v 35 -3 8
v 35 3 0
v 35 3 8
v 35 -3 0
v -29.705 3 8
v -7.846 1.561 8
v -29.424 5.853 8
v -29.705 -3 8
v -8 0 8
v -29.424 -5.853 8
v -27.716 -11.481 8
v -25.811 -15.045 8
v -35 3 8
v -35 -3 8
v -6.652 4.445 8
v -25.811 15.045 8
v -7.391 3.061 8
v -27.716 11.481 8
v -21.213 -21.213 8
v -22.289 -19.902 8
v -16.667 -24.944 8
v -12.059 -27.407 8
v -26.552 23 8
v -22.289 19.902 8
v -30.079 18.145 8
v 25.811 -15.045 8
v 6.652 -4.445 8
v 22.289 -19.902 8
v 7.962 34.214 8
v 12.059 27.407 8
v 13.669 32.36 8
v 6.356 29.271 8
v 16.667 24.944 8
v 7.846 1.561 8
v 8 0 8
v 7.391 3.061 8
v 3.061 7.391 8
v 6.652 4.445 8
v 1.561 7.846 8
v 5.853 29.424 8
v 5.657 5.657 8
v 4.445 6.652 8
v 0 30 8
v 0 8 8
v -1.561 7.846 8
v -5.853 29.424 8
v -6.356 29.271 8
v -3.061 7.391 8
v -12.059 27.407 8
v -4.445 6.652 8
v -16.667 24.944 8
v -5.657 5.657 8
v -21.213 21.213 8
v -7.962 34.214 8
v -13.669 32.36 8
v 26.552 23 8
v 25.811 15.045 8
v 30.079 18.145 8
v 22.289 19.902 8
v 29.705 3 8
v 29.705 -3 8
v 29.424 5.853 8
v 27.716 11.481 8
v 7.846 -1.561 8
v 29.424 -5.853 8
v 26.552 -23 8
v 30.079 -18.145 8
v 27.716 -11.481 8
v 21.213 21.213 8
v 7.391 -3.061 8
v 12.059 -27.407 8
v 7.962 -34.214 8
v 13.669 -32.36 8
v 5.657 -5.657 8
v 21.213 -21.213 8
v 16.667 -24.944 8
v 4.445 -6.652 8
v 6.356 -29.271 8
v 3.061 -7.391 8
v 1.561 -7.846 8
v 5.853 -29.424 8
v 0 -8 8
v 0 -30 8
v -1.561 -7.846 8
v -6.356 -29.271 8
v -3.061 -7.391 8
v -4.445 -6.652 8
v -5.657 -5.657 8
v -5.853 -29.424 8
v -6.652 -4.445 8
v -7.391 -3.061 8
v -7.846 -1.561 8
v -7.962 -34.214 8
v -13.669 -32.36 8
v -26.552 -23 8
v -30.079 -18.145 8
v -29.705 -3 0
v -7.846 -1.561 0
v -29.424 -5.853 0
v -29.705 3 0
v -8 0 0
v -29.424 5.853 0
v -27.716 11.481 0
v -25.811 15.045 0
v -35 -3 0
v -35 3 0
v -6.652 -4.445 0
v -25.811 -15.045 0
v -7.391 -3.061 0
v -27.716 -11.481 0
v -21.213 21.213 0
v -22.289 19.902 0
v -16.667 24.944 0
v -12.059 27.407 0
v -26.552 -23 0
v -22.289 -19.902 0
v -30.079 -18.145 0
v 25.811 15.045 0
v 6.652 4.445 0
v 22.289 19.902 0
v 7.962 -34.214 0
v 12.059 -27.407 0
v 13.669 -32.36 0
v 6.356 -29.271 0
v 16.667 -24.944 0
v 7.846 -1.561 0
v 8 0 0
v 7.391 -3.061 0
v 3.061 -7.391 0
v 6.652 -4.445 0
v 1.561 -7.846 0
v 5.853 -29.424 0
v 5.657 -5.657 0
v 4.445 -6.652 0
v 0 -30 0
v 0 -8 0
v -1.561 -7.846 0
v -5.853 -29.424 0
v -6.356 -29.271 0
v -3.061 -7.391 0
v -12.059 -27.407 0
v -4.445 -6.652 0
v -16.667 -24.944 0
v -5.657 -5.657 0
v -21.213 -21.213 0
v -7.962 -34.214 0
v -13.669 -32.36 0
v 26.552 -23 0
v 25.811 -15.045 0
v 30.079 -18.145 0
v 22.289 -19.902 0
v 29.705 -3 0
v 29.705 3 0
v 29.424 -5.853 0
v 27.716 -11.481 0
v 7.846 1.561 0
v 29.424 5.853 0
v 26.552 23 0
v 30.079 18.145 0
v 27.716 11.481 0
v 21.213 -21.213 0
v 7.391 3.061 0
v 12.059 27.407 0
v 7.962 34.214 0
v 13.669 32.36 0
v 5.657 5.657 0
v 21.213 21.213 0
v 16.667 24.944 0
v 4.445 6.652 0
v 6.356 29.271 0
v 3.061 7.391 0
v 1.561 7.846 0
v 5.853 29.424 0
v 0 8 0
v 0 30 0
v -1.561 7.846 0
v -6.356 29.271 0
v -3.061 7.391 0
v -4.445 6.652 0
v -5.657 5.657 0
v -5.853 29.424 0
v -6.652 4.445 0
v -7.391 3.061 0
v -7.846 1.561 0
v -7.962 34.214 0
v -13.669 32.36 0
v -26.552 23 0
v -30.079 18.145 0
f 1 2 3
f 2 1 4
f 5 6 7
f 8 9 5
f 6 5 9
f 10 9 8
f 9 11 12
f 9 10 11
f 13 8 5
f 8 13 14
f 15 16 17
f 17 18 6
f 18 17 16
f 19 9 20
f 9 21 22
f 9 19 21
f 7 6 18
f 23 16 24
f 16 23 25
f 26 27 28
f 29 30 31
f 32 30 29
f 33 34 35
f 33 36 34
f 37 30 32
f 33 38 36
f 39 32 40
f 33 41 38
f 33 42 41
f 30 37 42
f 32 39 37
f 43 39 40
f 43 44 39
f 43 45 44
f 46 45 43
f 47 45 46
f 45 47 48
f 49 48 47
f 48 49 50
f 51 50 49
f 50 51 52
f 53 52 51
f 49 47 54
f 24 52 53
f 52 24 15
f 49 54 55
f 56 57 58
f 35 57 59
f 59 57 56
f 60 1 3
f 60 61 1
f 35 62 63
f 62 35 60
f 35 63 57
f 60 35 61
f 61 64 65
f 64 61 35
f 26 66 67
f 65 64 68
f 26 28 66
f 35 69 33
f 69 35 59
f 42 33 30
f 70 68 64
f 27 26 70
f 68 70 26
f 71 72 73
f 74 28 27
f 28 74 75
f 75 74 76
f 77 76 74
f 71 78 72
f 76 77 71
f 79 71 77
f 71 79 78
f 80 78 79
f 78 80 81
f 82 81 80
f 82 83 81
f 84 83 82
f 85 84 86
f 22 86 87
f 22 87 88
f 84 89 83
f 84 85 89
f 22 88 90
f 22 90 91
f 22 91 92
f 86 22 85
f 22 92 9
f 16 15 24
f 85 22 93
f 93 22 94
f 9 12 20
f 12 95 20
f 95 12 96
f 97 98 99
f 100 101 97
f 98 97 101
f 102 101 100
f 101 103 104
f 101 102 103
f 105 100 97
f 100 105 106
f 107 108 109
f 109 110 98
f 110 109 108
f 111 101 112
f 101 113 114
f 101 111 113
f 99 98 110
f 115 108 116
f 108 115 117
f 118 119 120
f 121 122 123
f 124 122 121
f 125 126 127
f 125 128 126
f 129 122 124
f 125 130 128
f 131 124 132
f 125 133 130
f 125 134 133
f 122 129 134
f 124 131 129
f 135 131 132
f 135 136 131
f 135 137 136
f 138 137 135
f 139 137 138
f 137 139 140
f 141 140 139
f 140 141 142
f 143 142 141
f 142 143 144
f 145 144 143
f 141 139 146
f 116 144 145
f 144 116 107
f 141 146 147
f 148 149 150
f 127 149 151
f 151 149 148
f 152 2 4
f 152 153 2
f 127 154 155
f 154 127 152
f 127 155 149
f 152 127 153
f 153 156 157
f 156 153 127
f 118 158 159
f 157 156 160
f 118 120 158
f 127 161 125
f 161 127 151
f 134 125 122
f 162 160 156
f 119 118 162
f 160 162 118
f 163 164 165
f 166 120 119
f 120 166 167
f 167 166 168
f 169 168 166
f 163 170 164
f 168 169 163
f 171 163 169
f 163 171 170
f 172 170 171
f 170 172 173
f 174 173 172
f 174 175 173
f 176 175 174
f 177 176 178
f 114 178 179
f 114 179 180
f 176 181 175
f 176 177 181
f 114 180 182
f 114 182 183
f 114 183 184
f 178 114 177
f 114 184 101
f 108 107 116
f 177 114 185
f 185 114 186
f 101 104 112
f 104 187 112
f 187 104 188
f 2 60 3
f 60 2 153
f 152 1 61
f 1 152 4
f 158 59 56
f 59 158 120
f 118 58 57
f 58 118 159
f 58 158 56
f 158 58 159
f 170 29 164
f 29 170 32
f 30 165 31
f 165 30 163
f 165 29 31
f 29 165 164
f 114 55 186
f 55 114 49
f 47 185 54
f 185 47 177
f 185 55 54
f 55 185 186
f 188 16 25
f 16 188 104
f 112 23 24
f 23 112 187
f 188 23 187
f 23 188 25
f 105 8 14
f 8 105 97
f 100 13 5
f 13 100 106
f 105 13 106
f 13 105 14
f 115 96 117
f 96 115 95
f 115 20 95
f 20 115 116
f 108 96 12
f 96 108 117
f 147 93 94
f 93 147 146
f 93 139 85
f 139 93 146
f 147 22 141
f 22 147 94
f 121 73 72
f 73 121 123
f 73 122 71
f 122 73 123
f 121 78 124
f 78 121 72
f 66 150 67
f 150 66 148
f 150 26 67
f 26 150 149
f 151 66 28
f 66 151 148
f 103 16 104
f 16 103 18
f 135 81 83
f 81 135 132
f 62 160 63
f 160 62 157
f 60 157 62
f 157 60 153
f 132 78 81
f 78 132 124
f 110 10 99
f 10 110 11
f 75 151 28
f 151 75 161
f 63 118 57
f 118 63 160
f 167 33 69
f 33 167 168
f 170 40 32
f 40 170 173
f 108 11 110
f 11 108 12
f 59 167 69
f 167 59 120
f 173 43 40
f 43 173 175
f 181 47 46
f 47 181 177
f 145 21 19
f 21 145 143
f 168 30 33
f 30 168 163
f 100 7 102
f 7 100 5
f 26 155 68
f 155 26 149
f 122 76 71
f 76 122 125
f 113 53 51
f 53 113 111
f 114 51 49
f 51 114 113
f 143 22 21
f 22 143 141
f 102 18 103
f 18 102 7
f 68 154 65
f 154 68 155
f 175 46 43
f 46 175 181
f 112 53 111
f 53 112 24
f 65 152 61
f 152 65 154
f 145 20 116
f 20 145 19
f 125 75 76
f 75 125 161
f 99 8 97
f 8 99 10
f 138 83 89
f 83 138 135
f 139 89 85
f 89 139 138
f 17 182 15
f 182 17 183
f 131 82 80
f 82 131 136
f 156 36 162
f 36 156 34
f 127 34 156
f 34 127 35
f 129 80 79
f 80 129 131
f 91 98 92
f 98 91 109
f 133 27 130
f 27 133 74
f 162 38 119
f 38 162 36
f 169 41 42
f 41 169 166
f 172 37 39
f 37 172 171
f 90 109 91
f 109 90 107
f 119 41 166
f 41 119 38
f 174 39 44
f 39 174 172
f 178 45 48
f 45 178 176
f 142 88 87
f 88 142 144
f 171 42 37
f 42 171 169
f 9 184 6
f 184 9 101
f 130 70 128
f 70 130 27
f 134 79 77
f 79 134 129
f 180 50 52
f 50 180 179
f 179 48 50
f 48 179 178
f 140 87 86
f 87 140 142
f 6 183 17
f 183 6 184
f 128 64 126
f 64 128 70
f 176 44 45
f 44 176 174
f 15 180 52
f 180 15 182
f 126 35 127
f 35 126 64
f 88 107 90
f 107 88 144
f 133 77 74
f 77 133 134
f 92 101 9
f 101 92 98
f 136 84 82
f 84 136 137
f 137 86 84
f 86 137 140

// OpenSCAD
$fn = 32;

// ----------------------------------------------------------------------
// Spur blank: bored gear blank
// ----------------------------------------------------------------------

// --- parameters (mm) ---
disc_r = 30;              // blank root radius
disc_t = 8;               // blank thickness
n_teeth = 10;             // stub tooth count
tooth_w = 6;              // tooth width at the root
tooth_h = 5;              // tooth height above the root
bore_r = 8;               // central bore radius

out_r = disc_r + tooth_h;  // tip radius
bbox_x = 70.0;  // measured width over the teeth
bbox_y = 68.43;  // measured depth over the teeth

difference() {
union() {
  cylinder(r = disc_r, h = disc_t);
  for (i = [0 : n_teeth - 1])
    rotate([0, 0, i * 360 / n_teeth])
      translate([disc_r - 1, -tooth_w / 2, 0])
        cube([tooth_h + 1, tooth_w, disc_t]);
}
  translate([0, 0, -1]) cylinder(r = bore_r, h = disc_t + 2);
}
